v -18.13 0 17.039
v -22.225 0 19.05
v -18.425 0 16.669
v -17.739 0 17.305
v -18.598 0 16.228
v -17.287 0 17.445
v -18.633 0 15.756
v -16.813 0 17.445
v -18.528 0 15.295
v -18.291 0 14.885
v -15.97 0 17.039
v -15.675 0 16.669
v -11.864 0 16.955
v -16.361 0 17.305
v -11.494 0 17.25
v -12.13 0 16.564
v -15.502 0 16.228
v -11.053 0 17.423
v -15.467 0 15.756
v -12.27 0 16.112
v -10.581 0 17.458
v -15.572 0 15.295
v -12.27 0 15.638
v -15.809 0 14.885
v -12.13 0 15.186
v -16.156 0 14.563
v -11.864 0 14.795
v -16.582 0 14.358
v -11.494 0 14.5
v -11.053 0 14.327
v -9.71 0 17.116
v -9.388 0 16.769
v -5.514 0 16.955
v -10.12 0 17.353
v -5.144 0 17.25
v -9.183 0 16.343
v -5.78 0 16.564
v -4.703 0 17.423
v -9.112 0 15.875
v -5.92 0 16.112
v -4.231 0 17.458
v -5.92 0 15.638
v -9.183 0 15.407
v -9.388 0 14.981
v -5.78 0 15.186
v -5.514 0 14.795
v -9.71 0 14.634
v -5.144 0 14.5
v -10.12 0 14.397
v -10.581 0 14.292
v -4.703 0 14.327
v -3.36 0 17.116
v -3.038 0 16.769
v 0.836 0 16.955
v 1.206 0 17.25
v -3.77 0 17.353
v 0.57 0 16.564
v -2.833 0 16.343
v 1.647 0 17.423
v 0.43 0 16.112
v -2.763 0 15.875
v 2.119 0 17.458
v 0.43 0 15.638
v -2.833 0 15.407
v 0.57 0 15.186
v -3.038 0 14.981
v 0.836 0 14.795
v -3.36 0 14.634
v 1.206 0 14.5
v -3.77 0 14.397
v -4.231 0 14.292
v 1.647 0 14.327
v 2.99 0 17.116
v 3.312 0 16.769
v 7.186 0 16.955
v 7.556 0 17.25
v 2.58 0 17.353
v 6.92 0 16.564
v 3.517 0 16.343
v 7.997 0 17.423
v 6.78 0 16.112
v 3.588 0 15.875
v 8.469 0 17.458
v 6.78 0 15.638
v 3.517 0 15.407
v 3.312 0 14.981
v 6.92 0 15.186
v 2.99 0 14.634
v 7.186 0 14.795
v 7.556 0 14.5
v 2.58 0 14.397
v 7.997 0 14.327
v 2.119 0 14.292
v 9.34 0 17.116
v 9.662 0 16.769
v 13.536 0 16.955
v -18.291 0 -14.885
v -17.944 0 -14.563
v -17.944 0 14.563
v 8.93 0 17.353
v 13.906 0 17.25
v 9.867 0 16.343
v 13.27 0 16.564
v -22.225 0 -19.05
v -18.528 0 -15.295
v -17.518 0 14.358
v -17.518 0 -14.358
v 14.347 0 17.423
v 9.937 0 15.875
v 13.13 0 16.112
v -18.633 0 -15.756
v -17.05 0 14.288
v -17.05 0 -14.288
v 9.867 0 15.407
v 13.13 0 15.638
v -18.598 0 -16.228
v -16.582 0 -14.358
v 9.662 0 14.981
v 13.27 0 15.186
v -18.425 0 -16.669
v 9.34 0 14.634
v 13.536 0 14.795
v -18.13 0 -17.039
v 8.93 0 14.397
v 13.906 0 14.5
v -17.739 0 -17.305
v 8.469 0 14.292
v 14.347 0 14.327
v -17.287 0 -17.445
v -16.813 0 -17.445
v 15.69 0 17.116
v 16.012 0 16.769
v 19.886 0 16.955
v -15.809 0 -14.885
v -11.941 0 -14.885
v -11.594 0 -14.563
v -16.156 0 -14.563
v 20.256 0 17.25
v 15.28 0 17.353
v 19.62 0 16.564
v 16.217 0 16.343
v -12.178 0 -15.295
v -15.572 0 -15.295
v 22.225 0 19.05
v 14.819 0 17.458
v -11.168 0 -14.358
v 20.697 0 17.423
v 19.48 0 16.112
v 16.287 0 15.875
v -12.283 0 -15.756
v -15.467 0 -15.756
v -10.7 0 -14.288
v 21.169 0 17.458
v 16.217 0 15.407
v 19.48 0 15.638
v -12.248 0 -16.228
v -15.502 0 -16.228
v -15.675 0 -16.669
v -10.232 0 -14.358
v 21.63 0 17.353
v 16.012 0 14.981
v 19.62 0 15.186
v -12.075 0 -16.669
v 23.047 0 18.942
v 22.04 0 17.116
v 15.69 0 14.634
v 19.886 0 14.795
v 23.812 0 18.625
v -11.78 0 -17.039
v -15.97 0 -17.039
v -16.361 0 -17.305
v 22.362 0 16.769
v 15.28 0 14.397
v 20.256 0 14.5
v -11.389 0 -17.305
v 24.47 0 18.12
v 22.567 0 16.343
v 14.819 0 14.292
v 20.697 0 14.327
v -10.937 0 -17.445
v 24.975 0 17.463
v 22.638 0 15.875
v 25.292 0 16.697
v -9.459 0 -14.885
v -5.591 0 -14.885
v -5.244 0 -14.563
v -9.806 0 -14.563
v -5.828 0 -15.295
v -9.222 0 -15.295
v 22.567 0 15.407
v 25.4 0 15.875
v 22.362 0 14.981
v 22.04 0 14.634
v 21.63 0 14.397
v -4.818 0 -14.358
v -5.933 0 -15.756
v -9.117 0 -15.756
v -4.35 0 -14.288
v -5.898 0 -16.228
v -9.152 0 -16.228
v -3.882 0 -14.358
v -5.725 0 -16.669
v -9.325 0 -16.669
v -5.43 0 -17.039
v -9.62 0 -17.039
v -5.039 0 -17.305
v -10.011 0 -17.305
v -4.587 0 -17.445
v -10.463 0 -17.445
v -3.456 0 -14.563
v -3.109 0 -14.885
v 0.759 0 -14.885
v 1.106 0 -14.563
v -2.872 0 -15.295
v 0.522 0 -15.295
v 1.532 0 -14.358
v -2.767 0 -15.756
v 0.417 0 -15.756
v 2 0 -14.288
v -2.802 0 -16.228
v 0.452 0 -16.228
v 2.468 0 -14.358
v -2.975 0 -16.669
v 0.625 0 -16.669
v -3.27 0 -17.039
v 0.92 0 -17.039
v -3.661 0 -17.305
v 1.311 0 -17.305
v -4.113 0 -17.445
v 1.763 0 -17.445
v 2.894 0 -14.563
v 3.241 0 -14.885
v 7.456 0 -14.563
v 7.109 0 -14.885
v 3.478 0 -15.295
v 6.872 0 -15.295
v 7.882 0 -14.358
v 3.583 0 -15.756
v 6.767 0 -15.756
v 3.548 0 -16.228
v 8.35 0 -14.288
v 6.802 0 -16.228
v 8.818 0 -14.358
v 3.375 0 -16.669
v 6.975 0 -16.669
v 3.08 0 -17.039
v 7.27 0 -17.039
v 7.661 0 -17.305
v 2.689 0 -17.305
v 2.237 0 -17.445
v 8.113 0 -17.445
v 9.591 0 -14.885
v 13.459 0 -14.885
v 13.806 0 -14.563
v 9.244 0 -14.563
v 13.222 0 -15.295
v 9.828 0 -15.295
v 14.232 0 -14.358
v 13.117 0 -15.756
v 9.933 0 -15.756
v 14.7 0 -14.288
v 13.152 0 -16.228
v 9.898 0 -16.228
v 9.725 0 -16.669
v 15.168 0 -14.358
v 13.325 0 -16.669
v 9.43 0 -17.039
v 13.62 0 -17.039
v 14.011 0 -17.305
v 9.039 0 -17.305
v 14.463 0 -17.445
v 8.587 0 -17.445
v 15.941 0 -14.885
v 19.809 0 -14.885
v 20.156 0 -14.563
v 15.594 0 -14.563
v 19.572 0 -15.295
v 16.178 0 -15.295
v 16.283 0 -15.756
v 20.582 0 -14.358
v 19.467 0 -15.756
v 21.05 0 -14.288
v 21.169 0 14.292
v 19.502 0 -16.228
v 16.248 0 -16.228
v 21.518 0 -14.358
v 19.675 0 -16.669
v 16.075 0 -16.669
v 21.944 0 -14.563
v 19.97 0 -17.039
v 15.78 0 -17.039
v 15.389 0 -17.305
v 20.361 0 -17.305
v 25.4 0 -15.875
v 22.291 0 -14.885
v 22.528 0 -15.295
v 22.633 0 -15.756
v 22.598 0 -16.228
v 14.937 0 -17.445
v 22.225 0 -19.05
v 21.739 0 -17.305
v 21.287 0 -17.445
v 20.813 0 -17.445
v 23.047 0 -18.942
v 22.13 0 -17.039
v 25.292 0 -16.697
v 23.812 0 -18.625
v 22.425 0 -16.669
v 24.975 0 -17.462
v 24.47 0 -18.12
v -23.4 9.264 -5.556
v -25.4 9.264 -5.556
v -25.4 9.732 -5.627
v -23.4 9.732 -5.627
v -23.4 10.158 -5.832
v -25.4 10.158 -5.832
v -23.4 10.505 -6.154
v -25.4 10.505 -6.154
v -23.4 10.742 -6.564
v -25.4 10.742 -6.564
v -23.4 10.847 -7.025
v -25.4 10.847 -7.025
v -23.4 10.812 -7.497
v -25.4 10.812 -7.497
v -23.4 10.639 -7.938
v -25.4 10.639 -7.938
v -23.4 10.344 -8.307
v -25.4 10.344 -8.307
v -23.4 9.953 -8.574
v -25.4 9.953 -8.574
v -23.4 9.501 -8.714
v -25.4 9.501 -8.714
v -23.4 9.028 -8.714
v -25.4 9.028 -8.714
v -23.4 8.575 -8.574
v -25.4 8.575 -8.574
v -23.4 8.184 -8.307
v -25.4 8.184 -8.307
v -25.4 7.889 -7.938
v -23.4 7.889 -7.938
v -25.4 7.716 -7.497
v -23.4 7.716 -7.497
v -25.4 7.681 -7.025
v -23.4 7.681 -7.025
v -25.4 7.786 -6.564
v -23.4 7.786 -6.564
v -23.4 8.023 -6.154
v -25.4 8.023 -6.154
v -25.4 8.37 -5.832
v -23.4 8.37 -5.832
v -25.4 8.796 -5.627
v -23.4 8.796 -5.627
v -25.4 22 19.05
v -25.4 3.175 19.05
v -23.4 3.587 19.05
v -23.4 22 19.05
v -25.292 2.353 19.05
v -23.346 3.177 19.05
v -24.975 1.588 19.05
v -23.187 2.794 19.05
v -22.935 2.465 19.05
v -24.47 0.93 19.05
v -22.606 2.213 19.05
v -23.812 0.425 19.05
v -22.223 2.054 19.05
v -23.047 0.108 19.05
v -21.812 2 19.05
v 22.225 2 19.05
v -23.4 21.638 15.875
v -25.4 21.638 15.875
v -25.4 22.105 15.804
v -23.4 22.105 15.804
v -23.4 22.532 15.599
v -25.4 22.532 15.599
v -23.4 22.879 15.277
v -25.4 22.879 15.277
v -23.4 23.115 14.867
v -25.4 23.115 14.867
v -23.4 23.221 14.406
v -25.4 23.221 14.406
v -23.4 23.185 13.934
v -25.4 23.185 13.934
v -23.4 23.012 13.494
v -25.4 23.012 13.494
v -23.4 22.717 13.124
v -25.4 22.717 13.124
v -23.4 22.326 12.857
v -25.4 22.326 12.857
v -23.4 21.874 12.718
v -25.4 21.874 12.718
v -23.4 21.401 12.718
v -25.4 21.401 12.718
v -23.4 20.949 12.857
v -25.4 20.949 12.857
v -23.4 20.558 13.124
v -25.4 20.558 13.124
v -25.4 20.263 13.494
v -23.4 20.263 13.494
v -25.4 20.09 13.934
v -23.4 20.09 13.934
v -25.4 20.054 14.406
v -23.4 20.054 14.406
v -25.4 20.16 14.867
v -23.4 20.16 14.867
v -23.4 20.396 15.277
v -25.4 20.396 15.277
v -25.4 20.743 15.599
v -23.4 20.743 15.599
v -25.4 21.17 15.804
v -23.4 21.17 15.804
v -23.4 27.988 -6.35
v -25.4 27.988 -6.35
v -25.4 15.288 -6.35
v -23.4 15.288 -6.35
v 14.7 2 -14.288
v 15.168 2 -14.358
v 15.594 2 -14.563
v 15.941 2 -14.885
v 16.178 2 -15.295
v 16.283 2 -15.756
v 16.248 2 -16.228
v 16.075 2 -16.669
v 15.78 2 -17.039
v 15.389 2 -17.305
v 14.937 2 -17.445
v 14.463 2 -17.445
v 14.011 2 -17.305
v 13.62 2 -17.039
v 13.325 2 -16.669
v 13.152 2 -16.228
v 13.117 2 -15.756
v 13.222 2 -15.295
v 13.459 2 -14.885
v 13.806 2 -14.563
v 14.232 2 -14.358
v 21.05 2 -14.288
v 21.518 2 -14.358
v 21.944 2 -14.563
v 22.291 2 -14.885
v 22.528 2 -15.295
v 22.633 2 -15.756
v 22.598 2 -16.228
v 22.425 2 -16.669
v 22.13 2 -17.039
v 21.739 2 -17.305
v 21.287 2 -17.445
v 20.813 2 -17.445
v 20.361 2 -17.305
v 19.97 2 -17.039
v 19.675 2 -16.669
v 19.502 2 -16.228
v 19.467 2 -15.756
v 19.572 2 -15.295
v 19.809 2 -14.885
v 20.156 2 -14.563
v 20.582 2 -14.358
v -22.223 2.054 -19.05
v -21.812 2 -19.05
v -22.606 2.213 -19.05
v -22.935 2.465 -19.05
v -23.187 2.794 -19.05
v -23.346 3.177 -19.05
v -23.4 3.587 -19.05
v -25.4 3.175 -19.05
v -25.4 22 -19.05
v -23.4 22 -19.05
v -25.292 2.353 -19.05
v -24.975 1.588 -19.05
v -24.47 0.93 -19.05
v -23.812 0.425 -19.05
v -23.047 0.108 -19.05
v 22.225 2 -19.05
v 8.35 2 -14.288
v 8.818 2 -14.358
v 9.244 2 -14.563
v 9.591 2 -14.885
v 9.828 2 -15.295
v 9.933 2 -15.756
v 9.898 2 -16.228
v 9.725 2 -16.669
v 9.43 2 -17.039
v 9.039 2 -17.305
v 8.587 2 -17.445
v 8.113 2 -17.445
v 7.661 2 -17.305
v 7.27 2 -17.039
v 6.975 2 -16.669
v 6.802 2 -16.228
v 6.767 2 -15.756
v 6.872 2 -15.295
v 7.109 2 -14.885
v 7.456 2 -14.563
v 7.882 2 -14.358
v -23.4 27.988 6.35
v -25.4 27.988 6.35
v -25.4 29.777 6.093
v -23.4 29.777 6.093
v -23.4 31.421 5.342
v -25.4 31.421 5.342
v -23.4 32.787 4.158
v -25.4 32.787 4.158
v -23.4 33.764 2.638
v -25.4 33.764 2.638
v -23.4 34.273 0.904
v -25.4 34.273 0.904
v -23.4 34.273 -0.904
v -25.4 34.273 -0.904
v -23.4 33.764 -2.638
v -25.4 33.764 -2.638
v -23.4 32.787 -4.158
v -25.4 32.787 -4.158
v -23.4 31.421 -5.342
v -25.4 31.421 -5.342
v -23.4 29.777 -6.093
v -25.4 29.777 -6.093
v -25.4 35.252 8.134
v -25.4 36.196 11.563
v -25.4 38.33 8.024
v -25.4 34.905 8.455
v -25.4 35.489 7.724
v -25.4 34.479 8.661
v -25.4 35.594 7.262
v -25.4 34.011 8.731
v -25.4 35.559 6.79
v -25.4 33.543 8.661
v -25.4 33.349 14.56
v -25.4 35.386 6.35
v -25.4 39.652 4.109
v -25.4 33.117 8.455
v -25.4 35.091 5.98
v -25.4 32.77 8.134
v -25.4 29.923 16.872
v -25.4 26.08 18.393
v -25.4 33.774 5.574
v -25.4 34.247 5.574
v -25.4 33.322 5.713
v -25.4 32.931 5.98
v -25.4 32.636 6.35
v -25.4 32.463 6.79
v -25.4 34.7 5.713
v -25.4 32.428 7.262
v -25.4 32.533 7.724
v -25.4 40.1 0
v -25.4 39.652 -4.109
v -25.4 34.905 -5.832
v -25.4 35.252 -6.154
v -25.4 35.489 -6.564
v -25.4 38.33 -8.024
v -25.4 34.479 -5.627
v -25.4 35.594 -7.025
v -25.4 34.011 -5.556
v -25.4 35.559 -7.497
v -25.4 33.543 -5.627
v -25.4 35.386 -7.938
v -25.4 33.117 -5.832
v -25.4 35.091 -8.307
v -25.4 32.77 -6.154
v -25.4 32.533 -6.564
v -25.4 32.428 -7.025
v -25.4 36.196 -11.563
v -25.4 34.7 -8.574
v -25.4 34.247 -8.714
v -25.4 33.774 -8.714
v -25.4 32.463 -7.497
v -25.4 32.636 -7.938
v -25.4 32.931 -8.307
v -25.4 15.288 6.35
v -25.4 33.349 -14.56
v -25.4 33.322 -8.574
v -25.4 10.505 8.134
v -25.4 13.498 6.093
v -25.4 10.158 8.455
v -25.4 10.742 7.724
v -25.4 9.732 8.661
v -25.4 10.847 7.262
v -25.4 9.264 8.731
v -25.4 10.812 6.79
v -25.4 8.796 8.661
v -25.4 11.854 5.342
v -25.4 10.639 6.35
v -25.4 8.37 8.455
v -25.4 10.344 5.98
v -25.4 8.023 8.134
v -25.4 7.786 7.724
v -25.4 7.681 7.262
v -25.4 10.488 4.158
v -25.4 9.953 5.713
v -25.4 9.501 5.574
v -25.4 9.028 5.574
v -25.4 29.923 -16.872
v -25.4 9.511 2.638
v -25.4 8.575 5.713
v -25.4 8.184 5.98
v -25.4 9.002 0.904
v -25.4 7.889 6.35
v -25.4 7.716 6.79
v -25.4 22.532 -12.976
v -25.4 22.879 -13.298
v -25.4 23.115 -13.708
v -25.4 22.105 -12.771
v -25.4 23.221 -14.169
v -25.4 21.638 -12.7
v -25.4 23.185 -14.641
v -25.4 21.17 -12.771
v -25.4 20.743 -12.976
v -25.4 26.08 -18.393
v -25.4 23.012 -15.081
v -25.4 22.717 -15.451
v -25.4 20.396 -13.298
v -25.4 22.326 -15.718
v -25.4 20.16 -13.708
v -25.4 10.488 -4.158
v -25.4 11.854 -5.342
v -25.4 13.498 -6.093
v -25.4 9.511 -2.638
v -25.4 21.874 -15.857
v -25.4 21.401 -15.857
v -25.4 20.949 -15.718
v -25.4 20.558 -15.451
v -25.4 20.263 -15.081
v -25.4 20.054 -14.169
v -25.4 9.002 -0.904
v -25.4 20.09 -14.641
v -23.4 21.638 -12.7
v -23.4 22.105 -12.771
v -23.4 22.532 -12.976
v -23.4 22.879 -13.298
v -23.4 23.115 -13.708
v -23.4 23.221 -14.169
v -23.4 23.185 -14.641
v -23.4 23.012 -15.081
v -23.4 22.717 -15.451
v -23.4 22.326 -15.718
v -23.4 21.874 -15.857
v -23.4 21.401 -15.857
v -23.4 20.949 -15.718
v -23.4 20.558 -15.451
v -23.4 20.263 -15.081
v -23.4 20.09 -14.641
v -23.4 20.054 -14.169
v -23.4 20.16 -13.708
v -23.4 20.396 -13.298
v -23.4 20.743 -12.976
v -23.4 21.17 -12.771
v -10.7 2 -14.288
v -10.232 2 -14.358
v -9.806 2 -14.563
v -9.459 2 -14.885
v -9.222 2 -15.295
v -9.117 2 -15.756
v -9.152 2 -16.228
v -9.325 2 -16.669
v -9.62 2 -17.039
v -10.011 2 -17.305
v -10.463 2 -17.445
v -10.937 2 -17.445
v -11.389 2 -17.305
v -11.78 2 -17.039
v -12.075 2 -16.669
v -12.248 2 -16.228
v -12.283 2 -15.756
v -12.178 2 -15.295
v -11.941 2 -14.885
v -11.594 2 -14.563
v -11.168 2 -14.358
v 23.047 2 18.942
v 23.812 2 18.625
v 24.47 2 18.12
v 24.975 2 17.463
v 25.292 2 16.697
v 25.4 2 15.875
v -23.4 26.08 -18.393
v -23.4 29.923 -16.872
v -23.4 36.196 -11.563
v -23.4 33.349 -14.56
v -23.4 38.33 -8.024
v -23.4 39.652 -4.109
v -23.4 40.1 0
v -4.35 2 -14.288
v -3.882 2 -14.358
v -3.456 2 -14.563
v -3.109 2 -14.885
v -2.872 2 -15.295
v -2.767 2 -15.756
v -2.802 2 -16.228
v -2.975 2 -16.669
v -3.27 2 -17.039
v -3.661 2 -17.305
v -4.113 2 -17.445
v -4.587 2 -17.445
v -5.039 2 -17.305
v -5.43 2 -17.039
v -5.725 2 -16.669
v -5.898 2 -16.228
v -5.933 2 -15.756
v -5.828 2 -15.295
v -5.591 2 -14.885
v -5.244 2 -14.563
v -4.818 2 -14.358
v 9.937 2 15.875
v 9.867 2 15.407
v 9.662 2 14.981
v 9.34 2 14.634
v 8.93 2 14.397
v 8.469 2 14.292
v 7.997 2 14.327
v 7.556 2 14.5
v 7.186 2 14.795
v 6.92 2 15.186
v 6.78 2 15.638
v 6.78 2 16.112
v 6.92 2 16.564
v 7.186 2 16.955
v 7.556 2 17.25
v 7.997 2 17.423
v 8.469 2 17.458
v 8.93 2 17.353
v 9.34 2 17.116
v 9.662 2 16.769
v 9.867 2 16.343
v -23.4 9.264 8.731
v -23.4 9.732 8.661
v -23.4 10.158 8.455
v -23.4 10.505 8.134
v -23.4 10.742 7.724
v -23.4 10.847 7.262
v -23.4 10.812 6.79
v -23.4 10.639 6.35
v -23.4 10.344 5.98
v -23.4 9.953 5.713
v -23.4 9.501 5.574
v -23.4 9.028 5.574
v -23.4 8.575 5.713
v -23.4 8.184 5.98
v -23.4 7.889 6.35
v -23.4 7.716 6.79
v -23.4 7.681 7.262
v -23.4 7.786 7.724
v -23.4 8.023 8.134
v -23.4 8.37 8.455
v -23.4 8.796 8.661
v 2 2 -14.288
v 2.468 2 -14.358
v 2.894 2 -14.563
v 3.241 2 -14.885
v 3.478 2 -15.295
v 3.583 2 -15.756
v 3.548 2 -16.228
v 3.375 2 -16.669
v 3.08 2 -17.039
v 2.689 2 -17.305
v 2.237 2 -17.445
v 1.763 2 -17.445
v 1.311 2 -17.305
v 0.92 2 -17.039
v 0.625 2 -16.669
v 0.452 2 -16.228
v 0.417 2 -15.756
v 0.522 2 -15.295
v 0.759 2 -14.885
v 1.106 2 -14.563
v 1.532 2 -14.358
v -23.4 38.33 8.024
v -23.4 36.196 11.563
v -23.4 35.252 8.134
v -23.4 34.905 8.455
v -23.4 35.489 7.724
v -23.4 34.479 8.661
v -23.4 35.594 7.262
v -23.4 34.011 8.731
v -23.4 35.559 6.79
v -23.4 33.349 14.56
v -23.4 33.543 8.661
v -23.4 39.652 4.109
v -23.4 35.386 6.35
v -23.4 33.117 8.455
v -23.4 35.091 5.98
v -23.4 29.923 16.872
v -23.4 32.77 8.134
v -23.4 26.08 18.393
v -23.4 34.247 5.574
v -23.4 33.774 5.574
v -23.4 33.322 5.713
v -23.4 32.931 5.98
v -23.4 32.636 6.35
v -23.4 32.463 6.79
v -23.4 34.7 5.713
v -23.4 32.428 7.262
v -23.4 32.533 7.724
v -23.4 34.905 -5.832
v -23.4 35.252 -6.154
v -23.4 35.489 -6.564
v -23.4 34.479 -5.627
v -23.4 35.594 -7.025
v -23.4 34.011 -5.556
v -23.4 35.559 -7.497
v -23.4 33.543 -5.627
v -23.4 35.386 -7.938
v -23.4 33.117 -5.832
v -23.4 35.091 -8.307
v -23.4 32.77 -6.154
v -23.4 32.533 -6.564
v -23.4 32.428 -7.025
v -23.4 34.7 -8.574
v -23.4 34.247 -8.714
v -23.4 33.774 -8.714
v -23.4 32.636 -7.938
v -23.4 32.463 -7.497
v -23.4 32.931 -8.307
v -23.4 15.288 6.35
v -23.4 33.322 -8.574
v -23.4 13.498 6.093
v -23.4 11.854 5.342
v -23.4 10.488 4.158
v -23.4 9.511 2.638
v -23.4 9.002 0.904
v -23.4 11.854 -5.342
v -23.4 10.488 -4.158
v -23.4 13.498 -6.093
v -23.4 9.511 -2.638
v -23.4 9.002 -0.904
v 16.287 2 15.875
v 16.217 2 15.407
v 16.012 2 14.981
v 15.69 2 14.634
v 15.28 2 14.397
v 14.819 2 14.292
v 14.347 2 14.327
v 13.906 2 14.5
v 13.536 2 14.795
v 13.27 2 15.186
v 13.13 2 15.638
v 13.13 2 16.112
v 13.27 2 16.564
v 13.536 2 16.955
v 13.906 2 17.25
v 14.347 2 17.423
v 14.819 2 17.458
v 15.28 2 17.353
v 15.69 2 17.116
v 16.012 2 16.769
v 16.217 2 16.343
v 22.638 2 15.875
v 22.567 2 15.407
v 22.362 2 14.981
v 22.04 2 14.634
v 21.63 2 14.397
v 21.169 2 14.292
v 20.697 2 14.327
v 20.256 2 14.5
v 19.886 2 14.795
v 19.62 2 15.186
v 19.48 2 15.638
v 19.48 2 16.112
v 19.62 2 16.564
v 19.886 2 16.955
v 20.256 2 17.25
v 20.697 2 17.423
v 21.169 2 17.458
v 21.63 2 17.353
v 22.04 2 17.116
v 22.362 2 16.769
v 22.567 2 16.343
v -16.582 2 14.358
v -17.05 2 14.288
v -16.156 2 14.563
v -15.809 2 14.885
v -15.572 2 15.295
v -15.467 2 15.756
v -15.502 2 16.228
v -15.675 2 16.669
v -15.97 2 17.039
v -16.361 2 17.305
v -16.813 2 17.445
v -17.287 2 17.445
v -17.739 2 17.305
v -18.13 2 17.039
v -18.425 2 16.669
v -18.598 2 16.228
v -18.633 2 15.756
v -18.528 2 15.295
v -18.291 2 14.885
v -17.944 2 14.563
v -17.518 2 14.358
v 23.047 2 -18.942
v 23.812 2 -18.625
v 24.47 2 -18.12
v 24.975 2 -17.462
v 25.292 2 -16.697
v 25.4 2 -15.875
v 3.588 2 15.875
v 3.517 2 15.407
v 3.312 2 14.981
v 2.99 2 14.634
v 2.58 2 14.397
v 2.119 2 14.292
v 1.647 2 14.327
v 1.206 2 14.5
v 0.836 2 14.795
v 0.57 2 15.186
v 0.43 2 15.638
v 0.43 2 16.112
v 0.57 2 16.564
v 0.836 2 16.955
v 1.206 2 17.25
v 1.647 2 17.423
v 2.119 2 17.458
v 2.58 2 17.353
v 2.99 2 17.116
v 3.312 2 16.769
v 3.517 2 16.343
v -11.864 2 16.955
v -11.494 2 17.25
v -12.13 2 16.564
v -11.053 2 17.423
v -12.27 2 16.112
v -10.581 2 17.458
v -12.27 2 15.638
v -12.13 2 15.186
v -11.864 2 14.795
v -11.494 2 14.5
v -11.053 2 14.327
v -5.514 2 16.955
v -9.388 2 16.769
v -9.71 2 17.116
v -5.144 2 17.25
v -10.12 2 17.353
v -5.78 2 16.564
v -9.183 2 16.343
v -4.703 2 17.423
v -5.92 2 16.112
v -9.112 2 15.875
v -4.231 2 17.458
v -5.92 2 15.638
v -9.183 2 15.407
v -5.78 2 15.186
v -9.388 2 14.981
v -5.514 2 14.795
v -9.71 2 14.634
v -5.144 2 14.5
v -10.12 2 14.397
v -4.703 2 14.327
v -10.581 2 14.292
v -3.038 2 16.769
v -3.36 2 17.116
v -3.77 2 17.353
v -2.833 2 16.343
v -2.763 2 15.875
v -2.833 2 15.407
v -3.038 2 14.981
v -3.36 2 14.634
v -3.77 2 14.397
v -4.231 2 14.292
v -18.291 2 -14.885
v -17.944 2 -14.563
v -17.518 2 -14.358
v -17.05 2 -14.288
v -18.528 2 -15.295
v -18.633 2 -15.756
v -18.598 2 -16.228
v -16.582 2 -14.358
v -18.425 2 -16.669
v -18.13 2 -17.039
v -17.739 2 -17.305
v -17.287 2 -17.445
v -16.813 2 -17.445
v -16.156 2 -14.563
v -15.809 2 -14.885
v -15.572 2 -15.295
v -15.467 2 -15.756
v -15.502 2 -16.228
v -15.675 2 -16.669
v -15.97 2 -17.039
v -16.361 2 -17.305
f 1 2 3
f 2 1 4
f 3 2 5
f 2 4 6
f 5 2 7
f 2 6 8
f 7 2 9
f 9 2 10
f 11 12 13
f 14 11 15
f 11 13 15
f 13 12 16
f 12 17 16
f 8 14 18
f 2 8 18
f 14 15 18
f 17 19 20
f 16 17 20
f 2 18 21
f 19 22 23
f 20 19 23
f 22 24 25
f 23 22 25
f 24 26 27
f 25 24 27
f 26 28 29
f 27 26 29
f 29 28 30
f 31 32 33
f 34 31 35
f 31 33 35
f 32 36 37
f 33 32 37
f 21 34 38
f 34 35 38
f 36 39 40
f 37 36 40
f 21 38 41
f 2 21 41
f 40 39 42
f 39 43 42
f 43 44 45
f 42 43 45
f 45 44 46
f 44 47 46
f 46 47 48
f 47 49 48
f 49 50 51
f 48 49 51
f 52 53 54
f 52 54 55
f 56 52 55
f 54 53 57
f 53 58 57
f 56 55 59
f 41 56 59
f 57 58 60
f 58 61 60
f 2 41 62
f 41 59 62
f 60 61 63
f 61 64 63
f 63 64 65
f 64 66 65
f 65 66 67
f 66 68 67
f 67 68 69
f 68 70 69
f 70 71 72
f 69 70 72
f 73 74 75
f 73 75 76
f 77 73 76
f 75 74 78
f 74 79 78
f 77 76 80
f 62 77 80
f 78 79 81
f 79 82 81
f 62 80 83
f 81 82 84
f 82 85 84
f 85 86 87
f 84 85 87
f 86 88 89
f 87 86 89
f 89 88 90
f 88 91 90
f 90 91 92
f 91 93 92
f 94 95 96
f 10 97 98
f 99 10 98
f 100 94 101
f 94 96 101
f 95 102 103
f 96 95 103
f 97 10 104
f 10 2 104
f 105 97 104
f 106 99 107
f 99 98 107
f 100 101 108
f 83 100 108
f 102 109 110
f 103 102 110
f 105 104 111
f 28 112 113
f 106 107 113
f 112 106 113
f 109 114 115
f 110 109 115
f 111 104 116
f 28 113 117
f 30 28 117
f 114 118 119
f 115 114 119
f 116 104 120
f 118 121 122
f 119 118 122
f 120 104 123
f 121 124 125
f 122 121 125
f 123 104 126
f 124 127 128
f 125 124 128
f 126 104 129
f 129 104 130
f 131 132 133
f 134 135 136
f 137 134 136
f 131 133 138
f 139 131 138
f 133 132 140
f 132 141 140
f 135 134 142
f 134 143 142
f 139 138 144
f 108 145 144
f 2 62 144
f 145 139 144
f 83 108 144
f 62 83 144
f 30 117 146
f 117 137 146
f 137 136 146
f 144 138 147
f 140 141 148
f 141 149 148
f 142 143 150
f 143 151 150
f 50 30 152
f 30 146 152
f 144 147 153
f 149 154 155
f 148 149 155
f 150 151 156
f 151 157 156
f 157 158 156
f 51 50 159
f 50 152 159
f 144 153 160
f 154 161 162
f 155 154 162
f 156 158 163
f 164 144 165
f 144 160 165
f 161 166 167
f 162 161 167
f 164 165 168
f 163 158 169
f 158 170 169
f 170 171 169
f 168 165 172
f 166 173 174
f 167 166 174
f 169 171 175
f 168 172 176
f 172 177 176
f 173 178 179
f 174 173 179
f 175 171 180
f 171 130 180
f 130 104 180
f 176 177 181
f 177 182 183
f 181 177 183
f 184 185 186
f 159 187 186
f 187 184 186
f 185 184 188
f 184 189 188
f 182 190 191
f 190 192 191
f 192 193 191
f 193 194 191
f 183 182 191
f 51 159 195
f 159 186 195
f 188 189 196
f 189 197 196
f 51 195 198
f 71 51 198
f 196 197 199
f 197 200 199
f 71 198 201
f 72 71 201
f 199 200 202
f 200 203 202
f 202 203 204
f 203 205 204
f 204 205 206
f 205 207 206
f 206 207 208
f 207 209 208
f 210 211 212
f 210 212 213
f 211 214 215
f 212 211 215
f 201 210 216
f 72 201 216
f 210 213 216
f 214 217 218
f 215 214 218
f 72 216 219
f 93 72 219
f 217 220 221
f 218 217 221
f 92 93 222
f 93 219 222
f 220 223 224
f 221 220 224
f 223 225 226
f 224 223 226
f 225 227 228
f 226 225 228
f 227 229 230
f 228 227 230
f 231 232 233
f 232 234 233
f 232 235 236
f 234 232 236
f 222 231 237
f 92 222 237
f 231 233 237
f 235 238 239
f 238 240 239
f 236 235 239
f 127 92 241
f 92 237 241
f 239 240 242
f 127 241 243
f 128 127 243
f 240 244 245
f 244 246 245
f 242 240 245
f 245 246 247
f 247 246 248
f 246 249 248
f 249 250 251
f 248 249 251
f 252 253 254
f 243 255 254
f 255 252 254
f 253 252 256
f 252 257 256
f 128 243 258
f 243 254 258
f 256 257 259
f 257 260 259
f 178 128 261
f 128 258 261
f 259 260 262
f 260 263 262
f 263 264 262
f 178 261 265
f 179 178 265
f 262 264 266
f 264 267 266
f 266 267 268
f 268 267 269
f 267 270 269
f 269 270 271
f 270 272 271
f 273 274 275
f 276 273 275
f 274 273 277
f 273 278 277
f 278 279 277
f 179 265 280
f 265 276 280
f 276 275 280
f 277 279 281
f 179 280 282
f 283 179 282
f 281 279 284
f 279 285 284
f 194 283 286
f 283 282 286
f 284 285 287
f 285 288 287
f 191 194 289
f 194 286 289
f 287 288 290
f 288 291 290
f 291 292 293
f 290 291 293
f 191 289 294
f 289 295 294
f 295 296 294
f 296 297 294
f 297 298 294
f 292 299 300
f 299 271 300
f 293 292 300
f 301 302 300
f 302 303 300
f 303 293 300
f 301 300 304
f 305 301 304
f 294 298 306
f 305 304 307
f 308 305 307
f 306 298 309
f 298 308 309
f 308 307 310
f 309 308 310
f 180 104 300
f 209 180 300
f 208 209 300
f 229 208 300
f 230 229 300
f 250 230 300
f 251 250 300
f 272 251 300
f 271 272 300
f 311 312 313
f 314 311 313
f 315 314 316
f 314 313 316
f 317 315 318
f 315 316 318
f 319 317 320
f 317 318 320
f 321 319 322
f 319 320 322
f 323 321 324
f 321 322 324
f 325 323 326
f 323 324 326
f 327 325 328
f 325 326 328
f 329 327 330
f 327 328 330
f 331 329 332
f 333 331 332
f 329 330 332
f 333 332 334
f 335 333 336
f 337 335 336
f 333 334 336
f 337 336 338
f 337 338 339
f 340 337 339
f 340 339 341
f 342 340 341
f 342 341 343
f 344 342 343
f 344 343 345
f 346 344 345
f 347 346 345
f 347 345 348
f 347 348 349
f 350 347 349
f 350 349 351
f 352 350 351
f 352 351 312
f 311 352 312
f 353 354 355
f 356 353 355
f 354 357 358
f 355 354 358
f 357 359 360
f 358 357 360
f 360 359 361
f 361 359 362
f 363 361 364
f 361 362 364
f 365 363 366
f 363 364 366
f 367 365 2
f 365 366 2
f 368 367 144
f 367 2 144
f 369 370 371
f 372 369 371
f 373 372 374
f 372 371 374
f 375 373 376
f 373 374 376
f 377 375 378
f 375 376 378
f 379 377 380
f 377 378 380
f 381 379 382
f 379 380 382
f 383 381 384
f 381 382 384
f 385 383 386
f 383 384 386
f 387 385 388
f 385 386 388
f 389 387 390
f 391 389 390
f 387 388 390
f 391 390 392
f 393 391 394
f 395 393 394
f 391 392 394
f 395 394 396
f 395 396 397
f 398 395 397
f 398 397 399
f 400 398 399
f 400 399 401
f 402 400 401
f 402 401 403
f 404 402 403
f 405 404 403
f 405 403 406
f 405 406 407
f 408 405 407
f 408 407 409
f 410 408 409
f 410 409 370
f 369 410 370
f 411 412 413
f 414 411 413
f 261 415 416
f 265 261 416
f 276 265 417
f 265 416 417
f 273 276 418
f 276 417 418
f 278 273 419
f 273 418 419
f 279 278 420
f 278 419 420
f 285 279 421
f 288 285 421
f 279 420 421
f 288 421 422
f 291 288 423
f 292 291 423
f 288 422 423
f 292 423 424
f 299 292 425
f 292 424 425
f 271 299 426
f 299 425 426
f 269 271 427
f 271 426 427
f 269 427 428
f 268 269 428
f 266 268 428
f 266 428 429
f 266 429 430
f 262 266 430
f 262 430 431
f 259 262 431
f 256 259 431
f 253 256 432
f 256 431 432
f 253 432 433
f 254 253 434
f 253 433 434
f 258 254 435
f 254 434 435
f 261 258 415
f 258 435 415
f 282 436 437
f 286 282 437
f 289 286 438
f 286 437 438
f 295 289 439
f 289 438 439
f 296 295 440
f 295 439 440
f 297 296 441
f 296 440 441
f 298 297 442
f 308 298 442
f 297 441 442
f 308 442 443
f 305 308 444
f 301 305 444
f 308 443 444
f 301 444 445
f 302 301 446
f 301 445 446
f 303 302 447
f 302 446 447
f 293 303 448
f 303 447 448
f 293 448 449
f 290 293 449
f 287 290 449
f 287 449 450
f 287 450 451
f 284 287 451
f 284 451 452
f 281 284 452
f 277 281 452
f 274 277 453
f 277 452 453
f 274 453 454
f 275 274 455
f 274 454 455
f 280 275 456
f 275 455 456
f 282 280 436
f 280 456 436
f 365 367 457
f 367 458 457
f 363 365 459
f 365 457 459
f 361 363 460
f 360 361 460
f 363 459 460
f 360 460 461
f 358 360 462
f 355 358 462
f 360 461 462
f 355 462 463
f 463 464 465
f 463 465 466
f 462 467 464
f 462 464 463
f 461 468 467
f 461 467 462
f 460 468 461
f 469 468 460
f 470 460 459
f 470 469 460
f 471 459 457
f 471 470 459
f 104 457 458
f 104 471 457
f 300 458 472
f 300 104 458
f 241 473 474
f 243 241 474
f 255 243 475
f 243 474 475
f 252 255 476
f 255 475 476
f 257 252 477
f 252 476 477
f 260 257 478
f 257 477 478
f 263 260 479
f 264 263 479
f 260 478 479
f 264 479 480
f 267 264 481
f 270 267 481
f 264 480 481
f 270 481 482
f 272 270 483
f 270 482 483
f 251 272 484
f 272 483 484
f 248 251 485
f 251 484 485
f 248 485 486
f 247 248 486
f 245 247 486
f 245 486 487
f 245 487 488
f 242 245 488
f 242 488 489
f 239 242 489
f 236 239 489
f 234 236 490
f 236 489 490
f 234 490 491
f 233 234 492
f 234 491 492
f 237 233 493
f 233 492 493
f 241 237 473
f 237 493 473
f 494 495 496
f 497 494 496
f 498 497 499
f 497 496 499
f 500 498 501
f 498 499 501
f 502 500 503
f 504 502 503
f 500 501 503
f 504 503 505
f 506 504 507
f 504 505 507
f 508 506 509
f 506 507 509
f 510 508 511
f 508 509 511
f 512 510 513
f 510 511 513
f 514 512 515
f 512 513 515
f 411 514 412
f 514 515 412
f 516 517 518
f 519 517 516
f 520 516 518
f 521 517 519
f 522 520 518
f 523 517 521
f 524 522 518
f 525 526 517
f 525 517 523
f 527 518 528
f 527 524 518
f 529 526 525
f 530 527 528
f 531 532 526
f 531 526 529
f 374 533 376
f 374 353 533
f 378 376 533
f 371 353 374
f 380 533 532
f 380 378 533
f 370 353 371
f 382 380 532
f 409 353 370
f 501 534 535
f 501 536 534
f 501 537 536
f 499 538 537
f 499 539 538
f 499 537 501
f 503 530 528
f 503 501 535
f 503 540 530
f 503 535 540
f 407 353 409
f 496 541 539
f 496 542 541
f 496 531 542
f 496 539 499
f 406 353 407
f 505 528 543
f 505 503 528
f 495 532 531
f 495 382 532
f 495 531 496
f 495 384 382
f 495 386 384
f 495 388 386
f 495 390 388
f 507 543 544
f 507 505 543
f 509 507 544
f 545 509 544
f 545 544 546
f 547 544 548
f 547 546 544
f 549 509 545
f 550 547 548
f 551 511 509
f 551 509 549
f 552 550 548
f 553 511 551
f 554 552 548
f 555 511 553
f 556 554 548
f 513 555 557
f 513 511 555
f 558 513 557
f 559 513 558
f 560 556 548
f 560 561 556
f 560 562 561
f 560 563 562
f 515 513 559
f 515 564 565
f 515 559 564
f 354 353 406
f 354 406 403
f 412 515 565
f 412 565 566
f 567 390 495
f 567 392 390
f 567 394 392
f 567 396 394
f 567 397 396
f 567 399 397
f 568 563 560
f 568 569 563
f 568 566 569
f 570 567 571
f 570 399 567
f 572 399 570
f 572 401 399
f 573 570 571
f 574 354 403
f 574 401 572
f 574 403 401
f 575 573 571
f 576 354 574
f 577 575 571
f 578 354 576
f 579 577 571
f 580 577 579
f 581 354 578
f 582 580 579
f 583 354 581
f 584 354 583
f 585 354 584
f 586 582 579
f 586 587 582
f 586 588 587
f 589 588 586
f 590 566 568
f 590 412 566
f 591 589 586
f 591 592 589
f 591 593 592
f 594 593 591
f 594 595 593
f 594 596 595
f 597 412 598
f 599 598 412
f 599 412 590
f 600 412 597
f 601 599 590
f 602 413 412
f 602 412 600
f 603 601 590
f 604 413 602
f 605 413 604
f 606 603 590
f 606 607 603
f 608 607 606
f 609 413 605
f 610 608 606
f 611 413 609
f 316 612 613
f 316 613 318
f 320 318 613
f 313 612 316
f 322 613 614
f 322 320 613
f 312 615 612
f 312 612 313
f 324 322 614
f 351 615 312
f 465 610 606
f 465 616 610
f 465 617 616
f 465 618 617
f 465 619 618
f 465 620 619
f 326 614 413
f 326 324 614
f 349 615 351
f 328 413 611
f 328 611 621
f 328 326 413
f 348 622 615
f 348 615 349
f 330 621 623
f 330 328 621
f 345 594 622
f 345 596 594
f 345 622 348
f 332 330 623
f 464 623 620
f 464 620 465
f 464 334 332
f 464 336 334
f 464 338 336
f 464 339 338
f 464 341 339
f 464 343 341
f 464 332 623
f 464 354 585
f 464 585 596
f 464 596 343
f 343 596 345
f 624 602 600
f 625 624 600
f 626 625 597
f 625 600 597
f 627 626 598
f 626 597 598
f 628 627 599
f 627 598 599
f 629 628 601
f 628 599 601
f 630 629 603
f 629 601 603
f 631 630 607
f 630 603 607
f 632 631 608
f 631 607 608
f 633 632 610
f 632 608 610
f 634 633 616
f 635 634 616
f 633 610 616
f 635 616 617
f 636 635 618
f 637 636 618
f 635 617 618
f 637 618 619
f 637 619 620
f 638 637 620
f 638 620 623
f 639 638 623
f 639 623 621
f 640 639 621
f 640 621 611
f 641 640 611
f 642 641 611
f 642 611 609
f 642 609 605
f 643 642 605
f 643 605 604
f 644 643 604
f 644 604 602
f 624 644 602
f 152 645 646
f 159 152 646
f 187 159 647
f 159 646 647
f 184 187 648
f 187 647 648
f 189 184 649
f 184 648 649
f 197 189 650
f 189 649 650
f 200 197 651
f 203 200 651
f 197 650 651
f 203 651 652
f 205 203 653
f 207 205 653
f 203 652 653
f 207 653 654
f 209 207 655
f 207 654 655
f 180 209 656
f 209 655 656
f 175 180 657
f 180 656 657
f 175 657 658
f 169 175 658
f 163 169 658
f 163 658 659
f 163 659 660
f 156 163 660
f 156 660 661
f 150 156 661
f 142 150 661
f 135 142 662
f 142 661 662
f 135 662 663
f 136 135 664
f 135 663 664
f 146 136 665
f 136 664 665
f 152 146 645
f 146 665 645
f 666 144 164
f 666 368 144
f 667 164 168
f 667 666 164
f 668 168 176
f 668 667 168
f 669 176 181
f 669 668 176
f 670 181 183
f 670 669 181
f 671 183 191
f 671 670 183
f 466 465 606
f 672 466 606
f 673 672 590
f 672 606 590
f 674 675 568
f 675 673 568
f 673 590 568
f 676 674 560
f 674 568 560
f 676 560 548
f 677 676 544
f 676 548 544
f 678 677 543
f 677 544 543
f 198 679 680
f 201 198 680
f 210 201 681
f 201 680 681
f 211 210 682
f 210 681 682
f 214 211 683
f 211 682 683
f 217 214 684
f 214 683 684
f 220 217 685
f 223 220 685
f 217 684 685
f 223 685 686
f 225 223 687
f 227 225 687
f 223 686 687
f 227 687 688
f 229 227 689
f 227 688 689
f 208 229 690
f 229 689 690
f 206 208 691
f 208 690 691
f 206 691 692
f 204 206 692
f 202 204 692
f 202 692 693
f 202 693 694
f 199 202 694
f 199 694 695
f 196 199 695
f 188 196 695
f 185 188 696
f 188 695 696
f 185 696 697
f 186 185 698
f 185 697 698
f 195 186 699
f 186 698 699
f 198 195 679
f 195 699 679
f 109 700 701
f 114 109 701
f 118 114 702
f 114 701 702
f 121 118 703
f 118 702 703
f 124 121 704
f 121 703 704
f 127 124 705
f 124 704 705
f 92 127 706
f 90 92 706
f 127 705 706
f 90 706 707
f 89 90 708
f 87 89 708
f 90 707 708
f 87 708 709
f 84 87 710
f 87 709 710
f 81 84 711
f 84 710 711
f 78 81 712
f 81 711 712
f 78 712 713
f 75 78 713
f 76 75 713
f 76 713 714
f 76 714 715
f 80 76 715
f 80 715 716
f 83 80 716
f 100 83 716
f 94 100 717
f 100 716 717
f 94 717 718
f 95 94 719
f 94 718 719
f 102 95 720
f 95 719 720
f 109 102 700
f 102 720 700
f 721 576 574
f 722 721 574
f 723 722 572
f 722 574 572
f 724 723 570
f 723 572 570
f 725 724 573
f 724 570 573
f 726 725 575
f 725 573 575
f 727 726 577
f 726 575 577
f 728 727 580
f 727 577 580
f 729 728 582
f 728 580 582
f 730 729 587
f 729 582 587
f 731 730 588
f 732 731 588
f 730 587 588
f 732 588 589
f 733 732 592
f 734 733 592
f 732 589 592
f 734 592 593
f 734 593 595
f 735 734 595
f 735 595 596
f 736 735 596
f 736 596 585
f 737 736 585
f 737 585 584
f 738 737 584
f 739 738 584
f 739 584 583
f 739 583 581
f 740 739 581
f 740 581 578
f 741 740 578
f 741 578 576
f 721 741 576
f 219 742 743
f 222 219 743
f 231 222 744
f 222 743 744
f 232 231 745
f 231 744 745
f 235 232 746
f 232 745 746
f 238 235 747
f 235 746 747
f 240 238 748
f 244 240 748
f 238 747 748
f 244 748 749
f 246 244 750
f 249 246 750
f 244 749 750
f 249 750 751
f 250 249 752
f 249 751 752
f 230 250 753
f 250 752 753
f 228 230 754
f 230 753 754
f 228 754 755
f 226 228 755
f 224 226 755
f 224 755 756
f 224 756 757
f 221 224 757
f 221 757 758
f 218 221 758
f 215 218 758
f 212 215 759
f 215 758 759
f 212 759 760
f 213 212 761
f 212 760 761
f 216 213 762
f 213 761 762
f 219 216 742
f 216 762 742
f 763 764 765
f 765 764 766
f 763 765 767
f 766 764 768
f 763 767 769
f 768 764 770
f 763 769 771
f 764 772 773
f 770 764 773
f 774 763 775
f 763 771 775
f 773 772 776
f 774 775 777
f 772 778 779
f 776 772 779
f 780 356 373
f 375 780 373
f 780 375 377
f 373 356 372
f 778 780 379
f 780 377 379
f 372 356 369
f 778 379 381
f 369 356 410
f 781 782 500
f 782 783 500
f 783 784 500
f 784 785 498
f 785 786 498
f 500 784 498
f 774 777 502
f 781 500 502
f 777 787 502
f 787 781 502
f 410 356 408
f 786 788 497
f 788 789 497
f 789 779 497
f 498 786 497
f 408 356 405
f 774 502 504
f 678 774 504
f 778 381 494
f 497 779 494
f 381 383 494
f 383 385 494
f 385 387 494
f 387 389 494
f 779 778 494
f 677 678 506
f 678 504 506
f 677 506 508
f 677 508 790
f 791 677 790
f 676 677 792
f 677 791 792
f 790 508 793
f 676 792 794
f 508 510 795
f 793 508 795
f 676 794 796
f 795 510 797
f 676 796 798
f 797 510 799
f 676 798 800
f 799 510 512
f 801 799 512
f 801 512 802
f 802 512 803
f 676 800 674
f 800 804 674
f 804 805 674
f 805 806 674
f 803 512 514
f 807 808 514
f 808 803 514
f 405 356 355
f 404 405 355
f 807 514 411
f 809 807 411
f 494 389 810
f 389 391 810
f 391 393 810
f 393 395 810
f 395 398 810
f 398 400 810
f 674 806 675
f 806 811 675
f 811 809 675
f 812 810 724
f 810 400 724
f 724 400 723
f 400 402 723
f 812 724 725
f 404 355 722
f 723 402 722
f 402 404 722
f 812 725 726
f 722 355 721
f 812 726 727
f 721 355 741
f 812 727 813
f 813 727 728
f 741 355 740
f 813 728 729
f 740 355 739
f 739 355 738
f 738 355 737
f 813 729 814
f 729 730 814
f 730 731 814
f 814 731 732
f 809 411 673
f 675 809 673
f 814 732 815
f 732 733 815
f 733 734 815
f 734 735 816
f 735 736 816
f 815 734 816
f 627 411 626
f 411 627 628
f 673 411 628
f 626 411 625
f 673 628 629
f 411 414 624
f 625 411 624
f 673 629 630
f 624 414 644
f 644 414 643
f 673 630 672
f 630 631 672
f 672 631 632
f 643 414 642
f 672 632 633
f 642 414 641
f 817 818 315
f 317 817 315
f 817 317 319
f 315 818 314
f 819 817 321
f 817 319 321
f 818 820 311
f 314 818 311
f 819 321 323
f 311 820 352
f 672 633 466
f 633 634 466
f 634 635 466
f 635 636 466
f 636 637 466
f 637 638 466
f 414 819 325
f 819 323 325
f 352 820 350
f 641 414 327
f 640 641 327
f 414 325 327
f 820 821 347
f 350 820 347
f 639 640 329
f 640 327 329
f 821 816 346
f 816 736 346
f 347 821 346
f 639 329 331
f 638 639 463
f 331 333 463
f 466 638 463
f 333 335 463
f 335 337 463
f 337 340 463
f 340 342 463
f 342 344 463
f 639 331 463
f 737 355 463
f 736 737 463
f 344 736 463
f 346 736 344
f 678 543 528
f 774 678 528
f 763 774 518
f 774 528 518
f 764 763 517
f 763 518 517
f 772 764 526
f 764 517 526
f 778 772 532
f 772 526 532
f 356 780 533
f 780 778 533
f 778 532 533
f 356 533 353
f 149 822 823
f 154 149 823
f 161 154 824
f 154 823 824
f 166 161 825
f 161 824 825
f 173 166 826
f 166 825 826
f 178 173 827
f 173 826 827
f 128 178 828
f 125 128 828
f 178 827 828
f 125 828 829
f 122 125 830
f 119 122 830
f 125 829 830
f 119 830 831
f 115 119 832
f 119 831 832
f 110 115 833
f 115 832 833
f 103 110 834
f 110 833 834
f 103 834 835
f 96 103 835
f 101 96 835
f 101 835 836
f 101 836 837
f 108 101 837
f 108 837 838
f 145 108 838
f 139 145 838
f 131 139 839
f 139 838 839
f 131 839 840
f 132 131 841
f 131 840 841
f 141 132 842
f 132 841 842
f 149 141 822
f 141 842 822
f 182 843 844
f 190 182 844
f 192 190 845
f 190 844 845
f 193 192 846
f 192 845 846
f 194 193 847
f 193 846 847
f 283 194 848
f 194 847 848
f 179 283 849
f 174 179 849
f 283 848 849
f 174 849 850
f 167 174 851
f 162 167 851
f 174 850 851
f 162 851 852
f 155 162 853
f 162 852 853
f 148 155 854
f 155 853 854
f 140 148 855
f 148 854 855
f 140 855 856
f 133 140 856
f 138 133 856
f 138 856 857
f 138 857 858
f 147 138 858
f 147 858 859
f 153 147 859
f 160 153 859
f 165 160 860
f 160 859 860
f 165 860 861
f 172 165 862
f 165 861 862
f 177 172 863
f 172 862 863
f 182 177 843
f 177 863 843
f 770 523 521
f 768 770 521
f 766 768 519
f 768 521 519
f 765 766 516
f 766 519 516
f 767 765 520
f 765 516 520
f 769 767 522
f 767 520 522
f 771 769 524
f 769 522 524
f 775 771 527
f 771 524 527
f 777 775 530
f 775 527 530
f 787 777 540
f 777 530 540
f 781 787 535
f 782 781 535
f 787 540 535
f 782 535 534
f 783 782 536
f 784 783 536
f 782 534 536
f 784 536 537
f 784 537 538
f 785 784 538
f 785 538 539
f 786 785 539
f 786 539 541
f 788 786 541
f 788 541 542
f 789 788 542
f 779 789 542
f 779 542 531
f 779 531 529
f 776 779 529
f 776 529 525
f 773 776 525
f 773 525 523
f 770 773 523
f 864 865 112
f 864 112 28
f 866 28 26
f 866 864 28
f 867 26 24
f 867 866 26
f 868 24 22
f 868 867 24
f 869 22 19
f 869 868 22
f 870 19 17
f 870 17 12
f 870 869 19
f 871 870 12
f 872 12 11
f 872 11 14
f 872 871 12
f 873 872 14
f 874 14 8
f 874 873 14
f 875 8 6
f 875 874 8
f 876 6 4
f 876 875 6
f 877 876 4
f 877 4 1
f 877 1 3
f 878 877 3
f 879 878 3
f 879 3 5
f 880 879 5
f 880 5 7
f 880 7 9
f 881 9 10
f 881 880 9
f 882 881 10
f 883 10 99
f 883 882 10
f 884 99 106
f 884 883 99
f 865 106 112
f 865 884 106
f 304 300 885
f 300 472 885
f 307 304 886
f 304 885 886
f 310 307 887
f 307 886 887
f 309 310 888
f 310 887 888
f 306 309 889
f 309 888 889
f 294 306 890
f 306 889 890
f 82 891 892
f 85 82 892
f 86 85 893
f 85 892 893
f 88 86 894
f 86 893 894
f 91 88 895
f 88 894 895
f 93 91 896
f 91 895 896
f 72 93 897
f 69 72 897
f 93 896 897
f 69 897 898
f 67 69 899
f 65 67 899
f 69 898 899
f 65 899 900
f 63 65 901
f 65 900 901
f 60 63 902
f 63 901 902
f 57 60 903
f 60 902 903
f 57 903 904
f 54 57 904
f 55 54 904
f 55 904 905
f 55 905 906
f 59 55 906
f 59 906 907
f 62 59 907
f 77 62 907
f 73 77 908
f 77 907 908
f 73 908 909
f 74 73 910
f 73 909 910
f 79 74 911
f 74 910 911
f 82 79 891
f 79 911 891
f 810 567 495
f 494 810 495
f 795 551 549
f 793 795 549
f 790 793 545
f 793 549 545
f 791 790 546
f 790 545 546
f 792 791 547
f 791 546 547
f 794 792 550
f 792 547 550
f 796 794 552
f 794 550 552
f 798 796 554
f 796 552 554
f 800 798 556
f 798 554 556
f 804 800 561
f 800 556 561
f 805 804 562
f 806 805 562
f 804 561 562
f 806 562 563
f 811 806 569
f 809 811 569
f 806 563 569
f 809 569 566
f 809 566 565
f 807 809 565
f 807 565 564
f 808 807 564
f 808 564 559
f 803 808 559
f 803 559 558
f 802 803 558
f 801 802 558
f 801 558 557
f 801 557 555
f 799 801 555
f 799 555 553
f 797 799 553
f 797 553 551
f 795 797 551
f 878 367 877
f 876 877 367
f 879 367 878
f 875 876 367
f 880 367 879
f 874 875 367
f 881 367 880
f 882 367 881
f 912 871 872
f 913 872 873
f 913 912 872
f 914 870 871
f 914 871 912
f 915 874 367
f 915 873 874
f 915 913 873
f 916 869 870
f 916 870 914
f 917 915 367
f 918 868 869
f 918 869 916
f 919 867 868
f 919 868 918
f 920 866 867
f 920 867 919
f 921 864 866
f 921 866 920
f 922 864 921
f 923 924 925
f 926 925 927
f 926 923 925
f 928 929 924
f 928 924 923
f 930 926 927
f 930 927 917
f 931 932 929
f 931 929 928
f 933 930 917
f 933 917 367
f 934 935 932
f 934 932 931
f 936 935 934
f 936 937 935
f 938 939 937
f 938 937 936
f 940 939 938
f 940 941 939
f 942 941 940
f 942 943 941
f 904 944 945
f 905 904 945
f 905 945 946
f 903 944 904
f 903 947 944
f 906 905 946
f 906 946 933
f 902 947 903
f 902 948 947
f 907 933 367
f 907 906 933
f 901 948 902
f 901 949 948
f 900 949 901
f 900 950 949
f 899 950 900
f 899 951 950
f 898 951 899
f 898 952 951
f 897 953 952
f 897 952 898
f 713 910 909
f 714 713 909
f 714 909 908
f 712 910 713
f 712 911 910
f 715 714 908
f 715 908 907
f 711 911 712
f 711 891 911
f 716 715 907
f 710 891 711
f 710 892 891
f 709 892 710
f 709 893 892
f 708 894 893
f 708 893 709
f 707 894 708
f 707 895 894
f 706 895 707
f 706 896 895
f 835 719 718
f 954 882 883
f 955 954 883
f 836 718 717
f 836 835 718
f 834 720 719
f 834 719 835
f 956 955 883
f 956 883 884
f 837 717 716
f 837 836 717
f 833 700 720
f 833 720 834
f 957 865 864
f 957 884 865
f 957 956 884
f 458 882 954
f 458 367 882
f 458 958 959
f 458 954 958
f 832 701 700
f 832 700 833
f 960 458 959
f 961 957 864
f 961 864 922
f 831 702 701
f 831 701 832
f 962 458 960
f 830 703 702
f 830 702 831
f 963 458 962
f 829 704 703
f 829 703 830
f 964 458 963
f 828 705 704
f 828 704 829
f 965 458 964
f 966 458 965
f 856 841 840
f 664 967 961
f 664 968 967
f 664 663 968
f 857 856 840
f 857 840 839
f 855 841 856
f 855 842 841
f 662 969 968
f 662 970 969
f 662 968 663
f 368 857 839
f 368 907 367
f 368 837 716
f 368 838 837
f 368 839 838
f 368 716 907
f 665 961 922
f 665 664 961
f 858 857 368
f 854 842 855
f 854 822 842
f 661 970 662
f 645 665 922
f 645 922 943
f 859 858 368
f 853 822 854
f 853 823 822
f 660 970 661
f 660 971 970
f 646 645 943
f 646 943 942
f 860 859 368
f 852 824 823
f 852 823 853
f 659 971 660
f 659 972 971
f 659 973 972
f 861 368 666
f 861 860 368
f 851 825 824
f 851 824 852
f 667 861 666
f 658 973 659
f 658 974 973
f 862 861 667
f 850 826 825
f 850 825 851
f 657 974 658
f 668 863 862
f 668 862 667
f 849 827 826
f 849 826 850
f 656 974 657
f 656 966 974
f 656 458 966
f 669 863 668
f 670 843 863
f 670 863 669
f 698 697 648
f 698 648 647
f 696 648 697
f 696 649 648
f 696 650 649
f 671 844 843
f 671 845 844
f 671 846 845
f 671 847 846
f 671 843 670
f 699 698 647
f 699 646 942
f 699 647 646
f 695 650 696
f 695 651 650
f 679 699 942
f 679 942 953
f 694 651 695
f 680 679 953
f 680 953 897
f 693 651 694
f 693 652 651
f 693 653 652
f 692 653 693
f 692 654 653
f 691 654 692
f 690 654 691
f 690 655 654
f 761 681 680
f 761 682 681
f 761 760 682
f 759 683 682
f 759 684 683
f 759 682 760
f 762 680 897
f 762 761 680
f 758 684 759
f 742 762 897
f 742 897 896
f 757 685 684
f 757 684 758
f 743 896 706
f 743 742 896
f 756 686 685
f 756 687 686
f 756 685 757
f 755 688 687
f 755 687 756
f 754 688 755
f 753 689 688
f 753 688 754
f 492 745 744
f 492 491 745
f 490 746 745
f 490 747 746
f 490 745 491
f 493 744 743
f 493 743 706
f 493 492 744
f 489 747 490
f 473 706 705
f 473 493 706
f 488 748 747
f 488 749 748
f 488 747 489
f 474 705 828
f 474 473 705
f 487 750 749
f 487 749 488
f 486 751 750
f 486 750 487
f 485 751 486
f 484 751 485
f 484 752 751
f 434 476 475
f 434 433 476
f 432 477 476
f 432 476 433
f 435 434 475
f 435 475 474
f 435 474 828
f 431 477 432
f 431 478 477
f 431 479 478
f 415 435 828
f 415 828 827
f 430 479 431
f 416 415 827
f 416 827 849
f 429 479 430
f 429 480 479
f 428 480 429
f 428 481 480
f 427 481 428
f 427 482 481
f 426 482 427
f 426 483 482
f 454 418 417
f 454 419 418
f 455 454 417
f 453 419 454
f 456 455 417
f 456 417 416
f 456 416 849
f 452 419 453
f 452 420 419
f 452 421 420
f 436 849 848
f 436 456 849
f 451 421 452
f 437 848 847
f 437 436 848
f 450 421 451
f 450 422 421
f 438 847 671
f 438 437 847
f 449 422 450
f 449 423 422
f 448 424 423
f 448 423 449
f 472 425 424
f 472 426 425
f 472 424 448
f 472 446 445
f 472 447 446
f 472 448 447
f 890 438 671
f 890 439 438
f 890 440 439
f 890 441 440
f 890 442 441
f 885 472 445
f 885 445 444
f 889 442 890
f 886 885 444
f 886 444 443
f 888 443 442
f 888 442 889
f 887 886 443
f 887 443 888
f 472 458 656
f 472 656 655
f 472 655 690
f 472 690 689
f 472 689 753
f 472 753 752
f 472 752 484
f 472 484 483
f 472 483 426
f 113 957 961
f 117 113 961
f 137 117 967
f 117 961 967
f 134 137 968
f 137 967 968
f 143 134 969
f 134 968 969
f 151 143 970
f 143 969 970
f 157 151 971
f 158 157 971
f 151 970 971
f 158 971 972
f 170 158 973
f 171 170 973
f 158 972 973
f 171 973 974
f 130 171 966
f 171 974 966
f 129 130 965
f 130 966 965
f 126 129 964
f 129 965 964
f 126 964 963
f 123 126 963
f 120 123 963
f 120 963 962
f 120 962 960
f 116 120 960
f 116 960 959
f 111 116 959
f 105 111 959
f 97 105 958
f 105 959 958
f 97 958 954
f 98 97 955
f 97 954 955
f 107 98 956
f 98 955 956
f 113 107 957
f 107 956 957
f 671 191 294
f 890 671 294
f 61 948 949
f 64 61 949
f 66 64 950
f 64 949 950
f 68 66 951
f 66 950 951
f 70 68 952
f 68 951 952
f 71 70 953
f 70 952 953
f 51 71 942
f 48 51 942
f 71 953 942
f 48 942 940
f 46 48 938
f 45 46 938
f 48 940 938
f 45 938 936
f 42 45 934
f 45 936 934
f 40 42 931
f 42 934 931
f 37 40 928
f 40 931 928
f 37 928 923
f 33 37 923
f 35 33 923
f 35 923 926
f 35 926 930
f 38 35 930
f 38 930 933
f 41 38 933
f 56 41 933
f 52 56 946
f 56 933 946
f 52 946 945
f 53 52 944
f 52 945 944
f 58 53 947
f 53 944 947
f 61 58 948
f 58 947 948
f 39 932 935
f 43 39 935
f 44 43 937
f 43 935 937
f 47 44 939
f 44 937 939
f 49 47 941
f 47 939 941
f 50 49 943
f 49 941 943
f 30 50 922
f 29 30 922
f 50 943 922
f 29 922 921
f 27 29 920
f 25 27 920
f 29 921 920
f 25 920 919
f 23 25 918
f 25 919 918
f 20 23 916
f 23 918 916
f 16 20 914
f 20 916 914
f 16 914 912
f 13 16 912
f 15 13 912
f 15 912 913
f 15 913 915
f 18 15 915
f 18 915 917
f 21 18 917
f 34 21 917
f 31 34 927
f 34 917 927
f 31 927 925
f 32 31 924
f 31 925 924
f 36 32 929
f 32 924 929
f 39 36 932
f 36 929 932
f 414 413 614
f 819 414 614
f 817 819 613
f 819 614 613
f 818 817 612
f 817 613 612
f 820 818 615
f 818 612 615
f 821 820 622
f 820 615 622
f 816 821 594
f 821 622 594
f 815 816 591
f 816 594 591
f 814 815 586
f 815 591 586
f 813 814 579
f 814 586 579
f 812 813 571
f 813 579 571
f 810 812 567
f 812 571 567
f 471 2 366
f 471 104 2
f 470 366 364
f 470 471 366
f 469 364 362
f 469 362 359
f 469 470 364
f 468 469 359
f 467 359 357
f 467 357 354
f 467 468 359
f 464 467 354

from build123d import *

# Parameters (mm, degrees)
SKETCH1_W               = 50.8
SKETCH1_H               = 38.1
BOSS_EXTRUDE1_DEPTH     = 2
SKETCH2_W               = 2
SKETCH2_H               = 38.1
BOSS_EXTRUDE2_DEPTH     = 38.1
CUT_EXTRUDE2_DEPTH      = 38.1
SKETCH4_R               = 1.5875
CUT_EXTRUDE3_DEPTH      = 2
LPATTERN1_COUNT         = 7
LPATTERN1_PITCH         = 6.35
MIRROR1_COPY_1_SKETCH_R = 1.5875
MIRROR1_COPY_1_DEPTH    = 2
MIRROR1_COPY_2_SKETCH_R = 1.5875
MIRROR1_COPY_2_DEPTH    = 2
MIRROR1_COPY_3_SKETCH_R = 1.5875
MIRROR1_COPY_3_DEPTH    = 2
MIRROR1_COPY_4_SKETCH_R = 1.5875
MIRROR1_COPY_4_DEPTH    = 2
MIRROR1_COPY_5_SKETCH_R = 1.5875
MIRROR1_COPY_5_DEPTH    = 2
MIRROR1_COPY_6_SKETCH_R = 1.5875
MIRROR1_COPY_6_DEPTH    = 2
FILLET1_R               = 3.175
FILLET2_R               = 1.5875
FILLET3_R               = 3.175
SKETCH5_R               = 1.5875
CUT_EXTRUDE4_DEPTH      = 68.46519473


with BuildPart() as part:
    # Sketch1 → Boss-Extrude1 (new body)
    with BuildSketch(Plane(origin=(0, 0, 0), x_dir=(1, 0, 0), z_dir=(0, 1, 0))):
        Rectangle(SKETCH1_W, SKETCH1_H)
    extrude(amount=BOSS_EXTRUDE1_DEPTH)

    # Sketch2 → Boss-Extrude2 (add)
    with BuildSketch(Plane(origin=(0, 2, 0), x_dir=(1, 0, 0), z_dir=(0, 1, 0))):
        with Locations((-24.4, 0)):
            Rectangle(SKETCH2_W, SKETCH2_H)
    extrude(amount=BOSS_EXTRUDE2_DEPTH)

    # Sketch3 → Cut-Extrude2 (cut)
    with BuildSketch(Plane.ZY.offset(25.4)):
        with BuildLine():
            Line((19.05, 40.1), (0, 40.1))
            ThreePointArc((0, 40.1), (13.138759324, 34.85352032), (19.05, 22.000124688))
            Line((19.05, 22.000124688), (19.05, 40.1))
        make_face()
        with BuildLine():
            Line((-19.05, 40.1), (-19.05, 22.000124688))
            ThreePointArc((-19.05, 22.000124688), (-13.138759324, 34.85352032), (0, 40.1))
            Line((0, 40.1), (-19.05, 40.1))
        make_face()
    extrude(amount=-CUT_EXTRUDE2_DEPTH, mode=Mode.SUBTRACT)

    # Sketch4 → Cut-Extrude3 (cut)
    with BuildSketch(Plane(origin=(0, 2, 0), x_dir=(1, 0, 0), z_dir=(0, 1, 0))):
        with Locations(Location((-17.05, 15.875, 0), (0, 0, 270))):
            Circle(SKETCH4_R)
    cut_extrude3 = extrude(amount=-CUT_EXTRUDE3_DEPTH, mode=Mode.SUBTRACT)

    # LPattern1: Cut-Extrude3 ×7
    with Locations(*[(i * LPATTERN1_PITCH, 0, 0) for i in range(1, LPATTERN1_COUNT)]):
        add(cut_extrude3, mode=Mode.SUBTRACT)

    # Mirror1: Cut-Extrude3 across plane
    add(cut_extrude3.mirror(Plane.XY), mode=Mode.SUBTRACT)

    # Mirror1 copy 1 sketch → Mirror1 copy 1 (cut)
    with BuildSketch(Plane(origin=(6.35, 2, 0), x_dir=(1, 0, 0), z_dir=(0, 1, 0))):
        with Locations((-17.05, -15.875)):
            Circle(MIRROR1_COPY_1_SKETCH_R)
    extrude(amount=-MIRROR1_COPY_1_DEPTH, mode=Mode.SUBTRACT)

    # Mirror1 copy 2 sketch → Mirror1 copy 2 (cut)
    with BuildSketch(Plane(origin=(12.7, 2, 0), x_dir=(1, 0, 0), z_dir=(0, 1, 0))):
        with Locations((-17.05, -15.875)):
            Circle(MIRROR1_COPY_2_SKETCH_R)
    extrude(amount=-MIRROR1_COPY_2_DEPTH, mode=Mode.SUBTRACT)

    # Mirror1 copy 3 sketch → Mirror1 copy 3 (cut)
    with BuildSketch(Plane(origin=(19.05, 2, 0), x_dir=(1, 0, 0), z_dir=(0, 1, 0))):
        with Locations((-17.05, -15.875)):
            Circle(MIRROR1_COPY_3_SKETCH_R)
    extrude(amount=-MIRROR1_COPY_3_DEPTH, mode=Mode.SUBTRACT)

    # Mirror1 copy 4 sketch → Mirror1 copy 4 (cut)
    with BuildSketch(Plane(origin=(25.4, 2, 0), x_dir=(1, 0, 0), z_dir=(0, 1, 0))):
        with Locations((-17.05, -15.875)):
            Circle(MIRROR1_COPY_4_SKETCH_R)
    extrude(amount=-MIRROR1_COPY_4_DEPTH, mode=Mode.SUBTRACT)

    # Mirror1 copy 5 sketch → Mirror1 copy 5 (cut)
    with BuildSketch(Plane(origin=(31.75, 2, 0), x_dir=(1, 0, 0), z_dir=(0, 1, 0))):
        with Locations((-17.05, -15.875)):
            Circle(MIRROR1_COPY_5_SKETCH_R)
    extrude(amount=-MIRROR1_COPY_5_DEPTH, mode=Mode.SUBTRACT)

    # Mirror1 copy 6 sketch → Mirror1 copy 6 (cut)
    with BuildSketch(Plane(origin=(38.1, 2, 0), x_dir=(1, 0, 0), z_dir=(0, 1, 0))):
        with Locations((-17.05, -15.875)):
            Circle(MIRROR1_COPY_6_SKETCH_R)
    extrude(amount=-MIRROR1_COPY_6_DEPTH, mode=Mode.SUBTRACT)

    # Fillet1
    fillet1_edges = [part.edges().sort_by_distance(p)[0] for p in [
        (25.4, 1, 19.05),
        (25.4, 1, -19.05),
    ]]
    fillet(fillet1_edges, radius=FILLET1_R)

    # Fillet2
    fillet2_edges = [part.edges().sort_by_distance(p)[0] for p in [
        (-23.4, 2, 0),
    ]]
    fillet(fillet2_edges, radius=FILLET2_R)

    # Fillet3
    fillet3_edges = [part.edges().sort_by_distance(p)[0] for p in [
        (-25.4, 0, 0),
    ]]
    fillet(fillet3_edges, radius=FILLET3_R)

    # Sketch5 → Cut-Extrude4 (cut, through all)
    with BuildSketch(Plane.ZY.offset(25.4)):
        with Locations((14.2875, 21.6375)):
            Circle(SKETCH5_R)
        with Locations((7.14375, 9.264162043)):
            Circle(SKETCH5_R)
        with Locations((-7.14375, 9.264162043)):
            Circle(SKETCH5_R)
        with Locations((-14.2875, 21.6375)):
            Circle(SKETCH5_R)
        with Locations((-7.14375, 34.010837957)):
            Circle(SKETCH5_R)
        with Locations((7.14375, 34.010837957)):
            Circle(SKETCH5_R)
        with BuildLine():
            Line((-6.35, 27.9875), (-6.35, 15.2875))
            ThreePointArc((-6.35, 15.2875), (0, 8.9375), (6.35, 15.2875))
            Line((6.35, 15.2875), (6.35, 27.9875))
            ThreePointArc((6.35, 27.9875), (0, 34.3375), (-6.35, 27.9875))
        make_face()
    extrude(amount=-CUT_EXTRUDE4_DEPTH, mode=Mode.SUBTRACT)


solid = part.part
